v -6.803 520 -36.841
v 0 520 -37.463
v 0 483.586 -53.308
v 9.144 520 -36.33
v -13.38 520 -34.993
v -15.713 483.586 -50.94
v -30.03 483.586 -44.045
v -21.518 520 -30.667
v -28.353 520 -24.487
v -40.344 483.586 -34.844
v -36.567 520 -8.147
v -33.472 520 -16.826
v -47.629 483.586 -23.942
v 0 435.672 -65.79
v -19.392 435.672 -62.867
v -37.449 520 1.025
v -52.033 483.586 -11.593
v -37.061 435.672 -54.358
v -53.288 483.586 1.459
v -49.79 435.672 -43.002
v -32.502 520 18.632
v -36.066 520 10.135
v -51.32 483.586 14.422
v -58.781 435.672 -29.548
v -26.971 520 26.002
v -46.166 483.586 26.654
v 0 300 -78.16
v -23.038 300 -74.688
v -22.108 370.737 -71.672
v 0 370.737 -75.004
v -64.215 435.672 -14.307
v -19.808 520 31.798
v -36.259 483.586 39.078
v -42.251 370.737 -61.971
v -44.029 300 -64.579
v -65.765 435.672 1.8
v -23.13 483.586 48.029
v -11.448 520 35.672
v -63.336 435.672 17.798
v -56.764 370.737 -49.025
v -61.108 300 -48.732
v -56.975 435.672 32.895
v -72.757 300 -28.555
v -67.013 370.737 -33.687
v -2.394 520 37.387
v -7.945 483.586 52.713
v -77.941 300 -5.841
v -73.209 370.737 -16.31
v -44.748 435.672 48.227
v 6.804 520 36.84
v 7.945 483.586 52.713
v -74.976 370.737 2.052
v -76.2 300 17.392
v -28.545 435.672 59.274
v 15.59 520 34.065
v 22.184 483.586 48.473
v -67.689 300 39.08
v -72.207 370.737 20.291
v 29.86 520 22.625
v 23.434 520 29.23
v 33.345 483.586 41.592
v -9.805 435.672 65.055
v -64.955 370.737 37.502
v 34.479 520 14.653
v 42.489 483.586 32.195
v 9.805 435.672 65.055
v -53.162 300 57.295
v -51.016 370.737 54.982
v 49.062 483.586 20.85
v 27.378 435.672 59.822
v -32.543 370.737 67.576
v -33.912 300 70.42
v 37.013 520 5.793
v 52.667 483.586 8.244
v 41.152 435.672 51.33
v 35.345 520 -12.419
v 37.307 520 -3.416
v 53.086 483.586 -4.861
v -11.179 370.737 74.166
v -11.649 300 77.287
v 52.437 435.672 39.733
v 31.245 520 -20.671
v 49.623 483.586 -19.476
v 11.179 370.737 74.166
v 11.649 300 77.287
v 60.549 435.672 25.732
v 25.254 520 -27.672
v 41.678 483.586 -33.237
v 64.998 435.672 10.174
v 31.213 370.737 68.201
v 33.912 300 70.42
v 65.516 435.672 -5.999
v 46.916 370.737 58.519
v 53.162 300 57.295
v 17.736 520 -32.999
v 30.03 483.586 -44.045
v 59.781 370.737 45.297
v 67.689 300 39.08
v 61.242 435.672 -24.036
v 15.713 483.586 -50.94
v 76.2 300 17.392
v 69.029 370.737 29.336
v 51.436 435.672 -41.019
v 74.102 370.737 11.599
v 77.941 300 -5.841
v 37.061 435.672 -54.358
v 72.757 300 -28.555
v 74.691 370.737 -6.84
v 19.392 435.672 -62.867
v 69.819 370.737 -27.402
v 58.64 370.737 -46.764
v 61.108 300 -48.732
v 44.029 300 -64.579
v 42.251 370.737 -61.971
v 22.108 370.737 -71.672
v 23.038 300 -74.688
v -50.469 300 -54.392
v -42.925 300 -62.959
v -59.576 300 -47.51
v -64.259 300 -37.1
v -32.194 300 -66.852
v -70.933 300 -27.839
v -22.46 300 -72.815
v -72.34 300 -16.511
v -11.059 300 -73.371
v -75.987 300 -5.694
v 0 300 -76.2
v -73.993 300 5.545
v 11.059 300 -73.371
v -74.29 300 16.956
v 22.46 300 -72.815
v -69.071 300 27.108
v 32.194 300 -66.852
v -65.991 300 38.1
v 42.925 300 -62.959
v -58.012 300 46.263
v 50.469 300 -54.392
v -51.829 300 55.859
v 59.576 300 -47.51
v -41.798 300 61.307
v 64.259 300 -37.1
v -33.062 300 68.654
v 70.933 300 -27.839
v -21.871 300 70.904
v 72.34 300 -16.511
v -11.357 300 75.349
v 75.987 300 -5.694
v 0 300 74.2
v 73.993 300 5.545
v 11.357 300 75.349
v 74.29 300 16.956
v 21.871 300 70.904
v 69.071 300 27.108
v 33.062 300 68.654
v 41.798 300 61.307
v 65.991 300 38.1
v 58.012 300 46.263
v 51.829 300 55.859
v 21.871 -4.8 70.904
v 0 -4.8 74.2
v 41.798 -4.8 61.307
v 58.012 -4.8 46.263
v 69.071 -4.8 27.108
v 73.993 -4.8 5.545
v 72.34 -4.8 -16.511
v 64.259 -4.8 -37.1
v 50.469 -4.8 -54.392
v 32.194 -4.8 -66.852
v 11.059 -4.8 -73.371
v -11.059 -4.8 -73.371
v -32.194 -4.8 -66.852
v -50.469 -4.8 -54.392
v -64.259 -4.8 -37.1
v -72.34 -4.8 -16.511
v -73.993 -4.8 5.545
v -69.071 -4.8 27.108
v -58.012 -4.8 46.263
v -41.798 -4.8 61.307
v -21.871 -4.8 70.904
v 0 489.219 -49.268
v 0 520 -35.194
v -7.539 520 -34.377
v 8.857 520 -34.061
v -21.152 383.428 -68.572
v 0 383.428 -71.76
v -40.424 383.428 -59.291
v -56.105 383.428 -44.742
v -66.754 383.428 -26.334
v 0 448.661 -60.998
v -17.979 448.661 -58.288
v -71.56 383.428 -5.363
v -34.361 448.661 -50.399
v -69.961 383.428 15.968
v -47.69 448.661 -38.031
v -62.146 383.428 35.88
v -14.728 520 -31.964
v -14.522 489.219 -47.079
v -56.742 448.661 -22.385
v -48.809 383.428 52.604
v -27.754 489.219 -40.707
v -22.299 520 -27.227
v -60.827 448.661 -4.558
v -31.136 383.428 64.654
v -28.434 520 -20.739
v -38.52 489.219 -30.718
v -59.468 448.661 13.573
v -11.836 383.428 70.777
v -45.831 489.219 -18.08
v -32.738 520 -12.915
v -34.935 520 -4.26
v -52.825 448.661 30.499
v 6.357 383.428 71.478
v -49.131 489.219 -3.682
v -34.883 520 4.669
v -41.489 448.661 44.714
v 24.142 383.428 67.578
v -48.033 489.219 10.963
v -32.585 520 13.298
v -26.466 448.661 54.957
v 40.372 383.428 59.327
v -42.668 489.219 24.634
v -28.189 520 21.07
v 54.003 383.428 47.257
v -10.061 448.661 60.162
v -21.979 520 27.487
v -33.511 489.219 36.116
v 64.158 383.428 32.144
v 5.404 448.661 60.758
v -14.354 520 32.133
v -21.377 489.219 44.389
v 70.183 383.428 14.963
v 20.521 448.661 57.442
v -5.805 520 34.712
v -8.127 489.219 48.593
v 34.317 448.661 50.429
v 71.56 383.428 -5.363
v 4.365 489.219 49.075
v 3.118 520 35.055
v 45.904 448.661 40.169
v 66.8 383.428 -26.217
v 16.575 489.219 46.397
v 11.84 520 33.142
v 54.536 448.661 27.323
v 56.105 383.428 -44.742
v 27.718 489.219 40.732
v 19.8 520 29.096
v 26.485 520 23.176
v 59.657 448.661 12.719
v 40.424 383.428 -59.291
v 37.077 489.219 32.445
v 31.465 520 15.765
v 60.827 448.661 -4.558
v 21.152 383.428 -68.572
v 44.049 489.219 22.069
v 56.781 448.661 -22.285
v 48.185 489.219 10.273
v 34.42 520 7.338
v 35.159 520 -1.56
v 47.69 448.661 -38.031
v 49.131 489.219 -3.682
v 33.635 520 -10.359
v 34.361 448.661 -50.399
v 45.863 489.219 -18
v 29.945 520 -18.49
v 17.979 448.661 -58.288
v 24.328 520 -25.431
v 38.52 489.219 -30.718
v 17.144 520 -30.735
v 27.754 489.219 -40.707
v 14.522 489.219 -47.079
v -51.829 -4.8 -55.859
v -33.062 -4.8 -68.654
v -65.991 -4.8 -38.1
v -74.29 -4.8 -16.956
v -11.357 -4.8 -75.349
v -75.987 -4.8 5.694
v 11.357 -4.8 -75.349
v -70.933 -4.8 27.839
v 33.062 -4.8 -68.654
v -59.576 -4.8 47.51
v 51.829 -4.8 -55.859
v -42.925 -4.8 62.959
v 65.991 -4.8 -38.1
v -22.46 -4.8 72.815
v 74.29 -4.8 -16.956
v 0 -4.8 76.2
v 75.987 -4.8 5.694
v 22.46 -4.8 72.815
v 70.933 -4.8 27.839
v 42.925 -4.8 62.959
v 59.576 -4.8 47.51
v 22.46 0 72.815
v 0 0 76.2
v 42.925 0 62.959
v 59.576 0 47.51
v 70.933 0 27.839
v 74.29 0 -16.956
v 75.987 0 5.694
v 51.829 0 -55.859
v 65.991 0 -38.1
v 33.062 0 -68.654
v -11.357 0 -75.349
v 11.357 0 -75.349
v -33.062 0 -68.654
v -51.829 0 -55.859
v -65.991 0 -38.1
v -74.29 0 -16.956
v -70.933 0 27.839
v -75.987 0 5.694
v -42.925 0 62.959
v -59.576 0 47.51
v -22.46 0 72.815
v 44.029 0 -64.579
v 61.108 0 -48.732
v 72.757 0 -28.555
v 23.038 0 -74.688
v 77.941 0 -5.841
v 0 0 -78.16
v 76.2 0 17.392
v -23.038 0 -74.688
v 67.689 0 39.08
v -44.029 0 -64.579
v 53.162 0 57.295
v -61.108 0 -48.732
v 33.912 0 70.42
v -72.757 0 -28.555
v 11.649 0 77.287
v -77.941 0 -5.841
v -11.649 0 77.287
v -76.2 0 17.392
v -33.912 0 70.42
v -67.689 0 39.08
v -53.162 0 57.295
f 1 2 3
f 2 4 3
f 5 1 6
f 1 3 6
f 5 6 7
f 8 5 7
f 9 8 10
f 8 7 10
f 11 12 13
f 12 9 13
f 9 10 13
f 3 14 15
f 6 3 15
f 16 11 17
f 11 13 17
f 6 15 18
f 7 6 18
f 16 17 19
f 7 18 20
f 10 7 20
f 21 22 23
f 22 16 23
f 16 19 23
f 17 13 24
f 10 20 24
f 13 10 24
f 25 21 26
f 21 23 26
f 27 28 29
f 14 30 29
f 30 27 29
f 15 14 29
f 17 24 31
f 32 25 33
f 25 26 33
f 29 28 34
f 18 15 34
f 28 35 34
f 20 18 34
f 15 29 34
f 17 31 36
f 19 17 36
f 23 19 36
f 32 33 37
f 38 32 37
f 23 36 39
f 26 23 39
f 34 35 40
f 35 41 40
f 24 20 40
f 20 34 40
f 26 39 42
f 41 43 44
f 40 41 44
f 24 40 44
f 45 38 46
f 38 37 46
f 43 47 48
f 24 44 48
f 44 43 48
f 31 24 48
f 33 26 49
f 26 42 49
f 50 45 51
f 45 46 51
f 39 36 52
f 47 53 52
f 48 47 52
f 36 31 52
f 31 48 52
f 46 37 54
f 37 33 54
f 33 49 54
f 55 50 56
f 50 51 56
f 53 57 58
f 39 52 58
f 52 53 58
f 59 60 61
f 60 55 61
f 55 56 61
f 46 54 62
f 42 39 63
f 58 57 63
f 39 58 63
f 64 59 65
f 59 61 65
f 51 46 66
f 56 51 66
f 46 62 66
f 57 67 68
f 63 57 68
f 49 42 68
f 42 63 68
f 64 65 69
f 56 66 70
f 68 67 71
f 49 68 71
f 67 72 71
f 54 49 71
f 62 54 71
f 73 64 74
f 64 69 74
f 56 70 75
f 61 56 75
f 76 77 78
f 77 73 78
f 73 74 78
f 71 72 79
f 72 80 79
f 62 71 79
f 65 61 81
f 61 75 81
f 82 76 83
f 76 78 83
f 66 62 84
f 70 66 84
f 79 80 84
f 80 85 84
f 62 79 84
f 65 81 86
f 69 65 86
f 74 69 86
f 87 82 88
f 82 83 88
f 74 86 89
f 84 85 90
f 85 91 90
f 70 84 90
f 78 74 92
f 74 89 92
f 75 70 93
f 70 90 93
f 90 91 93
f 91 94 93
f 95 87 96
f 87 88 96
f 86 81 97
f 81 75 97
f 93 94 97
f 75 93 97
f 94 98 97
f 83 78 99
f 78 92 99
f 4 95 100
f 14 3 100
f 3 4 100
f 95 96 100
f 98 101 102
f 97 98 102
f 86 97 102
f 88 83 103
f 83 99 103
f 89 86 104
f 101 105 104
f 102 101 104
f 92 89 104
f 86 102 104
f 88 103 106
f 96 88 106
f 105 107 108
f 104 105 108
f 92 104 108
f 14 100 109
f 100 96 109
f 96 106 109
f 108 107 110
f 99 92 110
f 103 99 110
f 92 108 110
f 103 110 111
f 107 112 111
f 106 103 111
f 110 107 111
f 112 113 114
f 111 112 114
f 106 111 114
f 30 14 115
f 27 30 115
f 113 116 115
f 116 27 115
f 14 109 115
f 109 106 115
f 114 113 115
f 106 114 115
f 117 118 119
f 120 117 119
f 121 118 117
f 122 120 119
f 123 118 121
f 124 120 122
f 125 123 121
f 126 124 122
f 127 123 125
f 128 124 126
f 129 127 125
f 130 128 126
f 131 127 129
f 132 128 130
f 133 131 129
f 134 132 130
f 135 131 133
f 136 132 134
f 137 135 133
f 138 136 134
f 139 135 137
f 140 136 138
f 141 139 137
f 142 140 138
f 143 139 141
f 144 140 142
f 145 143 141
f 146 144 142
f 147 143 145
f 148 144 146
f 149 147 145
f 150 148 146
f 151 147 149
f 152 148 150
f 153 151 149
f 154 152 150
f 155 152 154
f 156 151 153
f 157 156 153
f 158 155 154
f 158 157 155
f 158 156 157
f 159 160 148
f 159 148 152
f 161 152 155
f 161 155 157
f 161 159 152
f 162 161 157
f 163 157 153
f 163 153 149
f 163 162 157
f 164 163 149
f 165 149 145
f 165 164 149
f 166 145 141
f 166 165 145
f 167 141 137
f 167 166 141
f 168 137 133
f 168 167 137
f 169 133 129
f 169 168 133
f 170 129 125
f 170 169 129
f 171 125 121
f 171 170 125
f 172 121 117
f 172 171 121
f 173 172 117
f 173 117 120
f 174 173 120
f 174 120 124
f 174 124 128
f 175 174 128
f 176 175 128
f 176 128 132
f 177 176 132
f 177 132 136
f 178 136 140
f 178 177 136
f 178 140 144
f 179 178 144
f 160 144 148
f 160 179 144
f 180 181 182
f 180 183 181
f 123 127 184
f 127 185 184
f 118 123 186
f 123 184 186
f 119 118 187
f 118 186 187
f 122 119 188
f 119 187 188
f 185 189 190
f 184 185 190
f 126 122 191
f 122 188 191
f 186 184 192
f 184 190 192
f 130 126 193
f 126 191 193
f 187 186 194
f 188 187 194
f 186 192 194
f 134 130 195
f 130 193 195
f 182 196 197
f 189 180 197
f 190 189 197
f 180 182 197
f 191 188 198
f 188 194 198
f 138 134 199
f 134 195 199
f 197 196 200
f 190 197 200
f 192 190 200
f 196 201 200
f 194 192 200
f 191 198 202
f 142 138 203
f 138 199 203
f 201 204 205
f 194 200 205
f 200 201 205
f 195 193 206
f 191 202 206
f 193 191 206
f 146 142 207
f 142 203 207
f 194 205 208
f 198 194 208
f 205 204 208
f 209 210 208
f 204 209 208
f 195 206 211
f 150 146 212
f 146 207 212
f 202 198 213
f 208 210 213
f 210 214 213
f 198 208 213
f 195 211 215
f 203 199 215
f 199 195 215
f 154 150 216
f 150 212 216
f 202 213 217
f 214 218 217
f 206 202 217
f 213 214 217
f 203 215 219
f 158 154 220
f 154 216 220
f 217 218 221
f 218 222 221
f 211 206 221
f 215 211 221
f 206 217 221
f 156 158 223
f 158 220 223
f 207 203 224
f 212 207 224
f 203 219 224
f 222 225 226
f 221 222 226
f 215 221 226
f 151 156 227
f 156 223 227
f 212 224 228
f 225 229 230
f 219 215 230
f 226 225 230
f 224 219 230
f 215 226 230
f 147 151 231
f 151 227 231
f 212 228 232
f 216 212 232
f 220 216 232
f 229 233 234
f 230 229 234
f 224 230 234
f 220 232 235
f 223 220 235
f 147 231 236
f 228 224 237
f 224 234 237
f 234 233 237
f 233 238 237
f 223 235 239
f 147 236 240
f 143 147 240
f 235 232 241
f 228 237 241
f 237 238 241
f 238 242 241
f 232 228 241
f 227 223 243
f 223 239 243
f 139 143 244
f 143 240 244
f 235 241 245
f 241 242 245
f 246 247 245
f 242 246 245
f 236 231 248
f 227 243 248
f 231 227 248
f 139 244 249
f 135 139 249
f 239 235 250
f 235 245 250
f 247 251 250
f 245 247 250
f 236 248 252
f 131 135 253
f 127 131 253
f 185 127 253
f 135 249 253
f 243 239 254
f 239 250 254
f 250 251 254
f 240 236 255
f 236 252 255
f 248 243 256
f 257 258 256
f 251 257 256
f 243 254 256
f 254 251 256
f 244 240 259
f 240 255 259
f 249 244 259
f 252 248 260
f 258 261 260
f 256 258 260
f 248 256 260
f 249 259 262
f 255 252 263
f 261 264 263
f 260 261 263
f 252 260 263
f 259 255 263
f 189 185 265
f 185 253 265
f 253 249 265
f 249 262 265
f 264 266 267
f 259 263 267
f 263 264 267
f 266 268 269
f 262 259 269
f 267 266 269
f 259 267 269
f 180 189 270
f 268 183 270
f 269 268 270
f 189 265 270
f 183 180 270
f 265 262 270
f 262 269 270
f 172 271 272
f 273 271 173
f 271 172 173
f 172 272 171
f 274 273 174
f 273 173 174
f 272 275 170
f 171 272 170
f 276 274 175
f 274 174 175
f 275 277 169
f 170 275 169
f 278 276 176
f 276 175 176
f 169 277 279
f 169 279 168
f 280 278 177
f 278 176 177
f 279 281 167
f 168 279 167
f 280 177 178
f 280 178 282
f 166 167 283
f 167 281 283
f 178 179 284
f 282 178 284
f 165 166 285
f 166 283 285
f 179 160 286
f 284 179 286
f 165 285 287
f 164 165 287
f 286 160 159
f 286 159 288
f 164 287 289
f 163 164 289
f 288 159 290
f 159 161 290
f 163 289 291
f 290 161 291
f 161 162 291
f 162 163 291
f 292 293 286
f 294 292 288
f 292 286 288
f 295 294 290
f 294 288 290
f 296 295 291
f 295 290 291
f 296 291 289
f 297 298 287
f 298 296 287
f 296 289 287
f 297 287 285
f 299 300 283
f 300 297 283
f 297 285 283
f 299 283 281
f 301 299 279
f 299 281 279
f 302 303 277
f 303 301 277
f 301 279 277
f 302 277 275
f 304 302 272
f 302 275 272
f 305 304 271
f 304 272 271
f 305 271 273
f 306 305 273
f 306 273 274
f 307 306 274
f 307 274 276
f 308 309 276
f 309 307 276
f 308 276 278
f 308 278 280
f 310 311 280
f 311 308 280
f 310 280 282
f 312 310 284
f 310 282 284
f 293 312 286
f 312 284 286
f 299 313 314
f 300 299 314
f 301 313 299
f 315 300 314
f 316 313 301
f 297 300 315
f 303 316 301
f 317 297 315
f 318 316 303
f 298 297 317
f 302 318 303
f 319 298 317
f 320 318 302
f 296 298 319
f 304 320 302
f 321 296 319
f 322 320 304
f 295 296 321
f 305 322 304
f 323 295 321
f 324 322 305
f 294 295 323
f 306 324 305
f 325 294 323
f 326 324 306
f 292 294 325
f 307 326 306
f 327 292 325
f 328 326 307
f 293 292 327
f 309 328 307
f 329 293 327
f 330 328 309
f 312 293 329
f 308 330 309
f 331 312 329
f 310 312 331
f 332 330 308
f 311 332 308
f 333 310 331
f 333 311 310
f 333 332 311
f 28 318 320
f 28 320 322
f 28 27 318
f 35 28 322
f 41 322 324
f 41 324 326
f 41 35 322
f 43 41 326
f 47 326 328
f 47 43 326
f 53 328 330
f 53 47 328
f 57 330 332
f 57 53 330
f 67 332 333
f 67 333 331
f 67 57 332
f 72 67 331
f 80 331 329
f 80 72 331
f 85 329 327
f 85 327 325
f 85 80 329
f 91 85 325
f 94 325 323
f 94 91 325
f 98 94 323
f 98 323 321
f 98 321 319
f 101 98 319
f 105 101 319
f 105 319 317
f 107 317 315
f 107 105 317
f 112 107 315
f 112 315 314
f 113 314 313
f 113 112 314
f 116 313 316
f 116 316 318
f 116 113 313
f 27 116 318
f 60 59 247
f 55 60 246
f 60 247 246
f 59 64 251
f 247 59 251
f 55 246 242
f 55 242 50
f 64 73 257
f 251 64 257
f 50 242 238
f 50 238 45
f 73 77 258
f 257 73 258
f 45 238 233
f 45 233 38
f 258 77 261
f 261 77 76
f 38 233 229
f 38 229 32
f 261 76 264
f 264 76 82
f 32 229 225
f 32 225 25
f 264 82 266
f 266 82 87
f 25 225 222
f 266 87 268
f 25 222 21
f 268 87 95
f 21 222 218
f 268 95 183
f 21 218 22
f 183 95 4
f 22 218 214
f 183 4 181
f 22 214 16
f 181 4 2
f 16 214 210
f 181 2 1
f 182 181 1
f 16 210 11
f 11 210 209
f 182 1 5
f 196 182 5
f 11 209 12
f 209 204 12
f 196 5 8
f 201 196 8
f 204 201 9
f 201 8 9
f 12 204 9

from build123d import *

# Parameters (mm, degrees)
BOSS_EXTRUDE1_START = -304.8
SKETCH2_R           = 76.2
SKETCH2_R_2         = 74.2
BOSS_EXTRUDE1_DEPTH = 304.8
SKETCH3_R           = 102.13398709
CUT_EXTRUDE1_DEPTH  = 30


with BuildPart() as part:
    # Sketch1 → Revolve1 (revolve)
    with BuildSketch(Plane.XY, mode=Mode.PRIVATE) as revolve1_sk:
        with BuildLine():
            Line((76.2, 300), (76.2, 0))
            Line((76.2, 0), (78.16, 0))
            Line((78.16, 0), (78.16, 300))
            add(Edge.make_bspline(
                [(0, 550), (2.723149784, 550), (8.095363208, 549.131102803), (15.985209364, 545.313409978), (23.550682528, 539.130576689), (33.207143777, 527.875372886), (44.403572502, 508.368758892), (56.109342912, 477.087146412), (65.689764926, 439.080732548), (71.61438571, 402.993821619), (74.98797824, 372.299614595), (76.812690029, 348.58573428), (77.914396428, 324.415956203), (78.16, 308.124741441), (78.16, 300)],
                knots=[-1.570796327, -1.570796327, -1.570796327, -1.570796327, -1.472621556, -1.374446786, -1.276272016, -1.178097245, -0.981747704, -0.785398163, -0.589048623, -0.392699082, -0.294524311, -0.196349541, -0.09817477, 0, 0, 0, 0], degree=3))
            Line((0, 550), (0, 548.04))
            add(Edge.make_bspline(
                [(76.2, 300), (76.2, 548.04), (0, 548.04)],
                knots=[1.570796327, 1.570796327, 1.570796327, 3.141592654, 3.141592654, 3.141592654], degree=2, weights=[1, 0.707106781, 1]))
        make_face()
    revolve(revolve1_sk.sketch.rotate(Axis((0, 0, 0), (0, 1, 0)), 90), axis=Axis((0, 0, 0), (0, 1, 0)))

    # Sketch2 → Boss-Extrude1 (add)
    with BuildSketch(Plane(origin=(0, 300, 0), x_dir=(1, 0, 0), z_dir=(0, 1, 0)).offset(BOSS_EXTRUDE1_START)):
        with Locations(Location((0, 0, 0), (0, 0, 270))):
            Circle(SKETCH2_R)
        with Locations(Location((0, 0, 0), (0, 0, 270))):
            Circle(SKETCH2_R_2, mode=Mode.SUBTRACT)
    extrude(amount=BOSS_EXTRUDE1_DEPTH)

    # Sketch3 → Cut-Extrude1 (cut)
    with BuildSketch(Plane(origin=(0, 550, 0), x_dir=(-1, 0, 0), z_dir=(0, -1, 0))):
        Circle(SKETCH3_R)
    extrude(amount=CUT_EXTRUDE1_DEPTH, mode=Mode.SUBTRACT)


solid = part.part
